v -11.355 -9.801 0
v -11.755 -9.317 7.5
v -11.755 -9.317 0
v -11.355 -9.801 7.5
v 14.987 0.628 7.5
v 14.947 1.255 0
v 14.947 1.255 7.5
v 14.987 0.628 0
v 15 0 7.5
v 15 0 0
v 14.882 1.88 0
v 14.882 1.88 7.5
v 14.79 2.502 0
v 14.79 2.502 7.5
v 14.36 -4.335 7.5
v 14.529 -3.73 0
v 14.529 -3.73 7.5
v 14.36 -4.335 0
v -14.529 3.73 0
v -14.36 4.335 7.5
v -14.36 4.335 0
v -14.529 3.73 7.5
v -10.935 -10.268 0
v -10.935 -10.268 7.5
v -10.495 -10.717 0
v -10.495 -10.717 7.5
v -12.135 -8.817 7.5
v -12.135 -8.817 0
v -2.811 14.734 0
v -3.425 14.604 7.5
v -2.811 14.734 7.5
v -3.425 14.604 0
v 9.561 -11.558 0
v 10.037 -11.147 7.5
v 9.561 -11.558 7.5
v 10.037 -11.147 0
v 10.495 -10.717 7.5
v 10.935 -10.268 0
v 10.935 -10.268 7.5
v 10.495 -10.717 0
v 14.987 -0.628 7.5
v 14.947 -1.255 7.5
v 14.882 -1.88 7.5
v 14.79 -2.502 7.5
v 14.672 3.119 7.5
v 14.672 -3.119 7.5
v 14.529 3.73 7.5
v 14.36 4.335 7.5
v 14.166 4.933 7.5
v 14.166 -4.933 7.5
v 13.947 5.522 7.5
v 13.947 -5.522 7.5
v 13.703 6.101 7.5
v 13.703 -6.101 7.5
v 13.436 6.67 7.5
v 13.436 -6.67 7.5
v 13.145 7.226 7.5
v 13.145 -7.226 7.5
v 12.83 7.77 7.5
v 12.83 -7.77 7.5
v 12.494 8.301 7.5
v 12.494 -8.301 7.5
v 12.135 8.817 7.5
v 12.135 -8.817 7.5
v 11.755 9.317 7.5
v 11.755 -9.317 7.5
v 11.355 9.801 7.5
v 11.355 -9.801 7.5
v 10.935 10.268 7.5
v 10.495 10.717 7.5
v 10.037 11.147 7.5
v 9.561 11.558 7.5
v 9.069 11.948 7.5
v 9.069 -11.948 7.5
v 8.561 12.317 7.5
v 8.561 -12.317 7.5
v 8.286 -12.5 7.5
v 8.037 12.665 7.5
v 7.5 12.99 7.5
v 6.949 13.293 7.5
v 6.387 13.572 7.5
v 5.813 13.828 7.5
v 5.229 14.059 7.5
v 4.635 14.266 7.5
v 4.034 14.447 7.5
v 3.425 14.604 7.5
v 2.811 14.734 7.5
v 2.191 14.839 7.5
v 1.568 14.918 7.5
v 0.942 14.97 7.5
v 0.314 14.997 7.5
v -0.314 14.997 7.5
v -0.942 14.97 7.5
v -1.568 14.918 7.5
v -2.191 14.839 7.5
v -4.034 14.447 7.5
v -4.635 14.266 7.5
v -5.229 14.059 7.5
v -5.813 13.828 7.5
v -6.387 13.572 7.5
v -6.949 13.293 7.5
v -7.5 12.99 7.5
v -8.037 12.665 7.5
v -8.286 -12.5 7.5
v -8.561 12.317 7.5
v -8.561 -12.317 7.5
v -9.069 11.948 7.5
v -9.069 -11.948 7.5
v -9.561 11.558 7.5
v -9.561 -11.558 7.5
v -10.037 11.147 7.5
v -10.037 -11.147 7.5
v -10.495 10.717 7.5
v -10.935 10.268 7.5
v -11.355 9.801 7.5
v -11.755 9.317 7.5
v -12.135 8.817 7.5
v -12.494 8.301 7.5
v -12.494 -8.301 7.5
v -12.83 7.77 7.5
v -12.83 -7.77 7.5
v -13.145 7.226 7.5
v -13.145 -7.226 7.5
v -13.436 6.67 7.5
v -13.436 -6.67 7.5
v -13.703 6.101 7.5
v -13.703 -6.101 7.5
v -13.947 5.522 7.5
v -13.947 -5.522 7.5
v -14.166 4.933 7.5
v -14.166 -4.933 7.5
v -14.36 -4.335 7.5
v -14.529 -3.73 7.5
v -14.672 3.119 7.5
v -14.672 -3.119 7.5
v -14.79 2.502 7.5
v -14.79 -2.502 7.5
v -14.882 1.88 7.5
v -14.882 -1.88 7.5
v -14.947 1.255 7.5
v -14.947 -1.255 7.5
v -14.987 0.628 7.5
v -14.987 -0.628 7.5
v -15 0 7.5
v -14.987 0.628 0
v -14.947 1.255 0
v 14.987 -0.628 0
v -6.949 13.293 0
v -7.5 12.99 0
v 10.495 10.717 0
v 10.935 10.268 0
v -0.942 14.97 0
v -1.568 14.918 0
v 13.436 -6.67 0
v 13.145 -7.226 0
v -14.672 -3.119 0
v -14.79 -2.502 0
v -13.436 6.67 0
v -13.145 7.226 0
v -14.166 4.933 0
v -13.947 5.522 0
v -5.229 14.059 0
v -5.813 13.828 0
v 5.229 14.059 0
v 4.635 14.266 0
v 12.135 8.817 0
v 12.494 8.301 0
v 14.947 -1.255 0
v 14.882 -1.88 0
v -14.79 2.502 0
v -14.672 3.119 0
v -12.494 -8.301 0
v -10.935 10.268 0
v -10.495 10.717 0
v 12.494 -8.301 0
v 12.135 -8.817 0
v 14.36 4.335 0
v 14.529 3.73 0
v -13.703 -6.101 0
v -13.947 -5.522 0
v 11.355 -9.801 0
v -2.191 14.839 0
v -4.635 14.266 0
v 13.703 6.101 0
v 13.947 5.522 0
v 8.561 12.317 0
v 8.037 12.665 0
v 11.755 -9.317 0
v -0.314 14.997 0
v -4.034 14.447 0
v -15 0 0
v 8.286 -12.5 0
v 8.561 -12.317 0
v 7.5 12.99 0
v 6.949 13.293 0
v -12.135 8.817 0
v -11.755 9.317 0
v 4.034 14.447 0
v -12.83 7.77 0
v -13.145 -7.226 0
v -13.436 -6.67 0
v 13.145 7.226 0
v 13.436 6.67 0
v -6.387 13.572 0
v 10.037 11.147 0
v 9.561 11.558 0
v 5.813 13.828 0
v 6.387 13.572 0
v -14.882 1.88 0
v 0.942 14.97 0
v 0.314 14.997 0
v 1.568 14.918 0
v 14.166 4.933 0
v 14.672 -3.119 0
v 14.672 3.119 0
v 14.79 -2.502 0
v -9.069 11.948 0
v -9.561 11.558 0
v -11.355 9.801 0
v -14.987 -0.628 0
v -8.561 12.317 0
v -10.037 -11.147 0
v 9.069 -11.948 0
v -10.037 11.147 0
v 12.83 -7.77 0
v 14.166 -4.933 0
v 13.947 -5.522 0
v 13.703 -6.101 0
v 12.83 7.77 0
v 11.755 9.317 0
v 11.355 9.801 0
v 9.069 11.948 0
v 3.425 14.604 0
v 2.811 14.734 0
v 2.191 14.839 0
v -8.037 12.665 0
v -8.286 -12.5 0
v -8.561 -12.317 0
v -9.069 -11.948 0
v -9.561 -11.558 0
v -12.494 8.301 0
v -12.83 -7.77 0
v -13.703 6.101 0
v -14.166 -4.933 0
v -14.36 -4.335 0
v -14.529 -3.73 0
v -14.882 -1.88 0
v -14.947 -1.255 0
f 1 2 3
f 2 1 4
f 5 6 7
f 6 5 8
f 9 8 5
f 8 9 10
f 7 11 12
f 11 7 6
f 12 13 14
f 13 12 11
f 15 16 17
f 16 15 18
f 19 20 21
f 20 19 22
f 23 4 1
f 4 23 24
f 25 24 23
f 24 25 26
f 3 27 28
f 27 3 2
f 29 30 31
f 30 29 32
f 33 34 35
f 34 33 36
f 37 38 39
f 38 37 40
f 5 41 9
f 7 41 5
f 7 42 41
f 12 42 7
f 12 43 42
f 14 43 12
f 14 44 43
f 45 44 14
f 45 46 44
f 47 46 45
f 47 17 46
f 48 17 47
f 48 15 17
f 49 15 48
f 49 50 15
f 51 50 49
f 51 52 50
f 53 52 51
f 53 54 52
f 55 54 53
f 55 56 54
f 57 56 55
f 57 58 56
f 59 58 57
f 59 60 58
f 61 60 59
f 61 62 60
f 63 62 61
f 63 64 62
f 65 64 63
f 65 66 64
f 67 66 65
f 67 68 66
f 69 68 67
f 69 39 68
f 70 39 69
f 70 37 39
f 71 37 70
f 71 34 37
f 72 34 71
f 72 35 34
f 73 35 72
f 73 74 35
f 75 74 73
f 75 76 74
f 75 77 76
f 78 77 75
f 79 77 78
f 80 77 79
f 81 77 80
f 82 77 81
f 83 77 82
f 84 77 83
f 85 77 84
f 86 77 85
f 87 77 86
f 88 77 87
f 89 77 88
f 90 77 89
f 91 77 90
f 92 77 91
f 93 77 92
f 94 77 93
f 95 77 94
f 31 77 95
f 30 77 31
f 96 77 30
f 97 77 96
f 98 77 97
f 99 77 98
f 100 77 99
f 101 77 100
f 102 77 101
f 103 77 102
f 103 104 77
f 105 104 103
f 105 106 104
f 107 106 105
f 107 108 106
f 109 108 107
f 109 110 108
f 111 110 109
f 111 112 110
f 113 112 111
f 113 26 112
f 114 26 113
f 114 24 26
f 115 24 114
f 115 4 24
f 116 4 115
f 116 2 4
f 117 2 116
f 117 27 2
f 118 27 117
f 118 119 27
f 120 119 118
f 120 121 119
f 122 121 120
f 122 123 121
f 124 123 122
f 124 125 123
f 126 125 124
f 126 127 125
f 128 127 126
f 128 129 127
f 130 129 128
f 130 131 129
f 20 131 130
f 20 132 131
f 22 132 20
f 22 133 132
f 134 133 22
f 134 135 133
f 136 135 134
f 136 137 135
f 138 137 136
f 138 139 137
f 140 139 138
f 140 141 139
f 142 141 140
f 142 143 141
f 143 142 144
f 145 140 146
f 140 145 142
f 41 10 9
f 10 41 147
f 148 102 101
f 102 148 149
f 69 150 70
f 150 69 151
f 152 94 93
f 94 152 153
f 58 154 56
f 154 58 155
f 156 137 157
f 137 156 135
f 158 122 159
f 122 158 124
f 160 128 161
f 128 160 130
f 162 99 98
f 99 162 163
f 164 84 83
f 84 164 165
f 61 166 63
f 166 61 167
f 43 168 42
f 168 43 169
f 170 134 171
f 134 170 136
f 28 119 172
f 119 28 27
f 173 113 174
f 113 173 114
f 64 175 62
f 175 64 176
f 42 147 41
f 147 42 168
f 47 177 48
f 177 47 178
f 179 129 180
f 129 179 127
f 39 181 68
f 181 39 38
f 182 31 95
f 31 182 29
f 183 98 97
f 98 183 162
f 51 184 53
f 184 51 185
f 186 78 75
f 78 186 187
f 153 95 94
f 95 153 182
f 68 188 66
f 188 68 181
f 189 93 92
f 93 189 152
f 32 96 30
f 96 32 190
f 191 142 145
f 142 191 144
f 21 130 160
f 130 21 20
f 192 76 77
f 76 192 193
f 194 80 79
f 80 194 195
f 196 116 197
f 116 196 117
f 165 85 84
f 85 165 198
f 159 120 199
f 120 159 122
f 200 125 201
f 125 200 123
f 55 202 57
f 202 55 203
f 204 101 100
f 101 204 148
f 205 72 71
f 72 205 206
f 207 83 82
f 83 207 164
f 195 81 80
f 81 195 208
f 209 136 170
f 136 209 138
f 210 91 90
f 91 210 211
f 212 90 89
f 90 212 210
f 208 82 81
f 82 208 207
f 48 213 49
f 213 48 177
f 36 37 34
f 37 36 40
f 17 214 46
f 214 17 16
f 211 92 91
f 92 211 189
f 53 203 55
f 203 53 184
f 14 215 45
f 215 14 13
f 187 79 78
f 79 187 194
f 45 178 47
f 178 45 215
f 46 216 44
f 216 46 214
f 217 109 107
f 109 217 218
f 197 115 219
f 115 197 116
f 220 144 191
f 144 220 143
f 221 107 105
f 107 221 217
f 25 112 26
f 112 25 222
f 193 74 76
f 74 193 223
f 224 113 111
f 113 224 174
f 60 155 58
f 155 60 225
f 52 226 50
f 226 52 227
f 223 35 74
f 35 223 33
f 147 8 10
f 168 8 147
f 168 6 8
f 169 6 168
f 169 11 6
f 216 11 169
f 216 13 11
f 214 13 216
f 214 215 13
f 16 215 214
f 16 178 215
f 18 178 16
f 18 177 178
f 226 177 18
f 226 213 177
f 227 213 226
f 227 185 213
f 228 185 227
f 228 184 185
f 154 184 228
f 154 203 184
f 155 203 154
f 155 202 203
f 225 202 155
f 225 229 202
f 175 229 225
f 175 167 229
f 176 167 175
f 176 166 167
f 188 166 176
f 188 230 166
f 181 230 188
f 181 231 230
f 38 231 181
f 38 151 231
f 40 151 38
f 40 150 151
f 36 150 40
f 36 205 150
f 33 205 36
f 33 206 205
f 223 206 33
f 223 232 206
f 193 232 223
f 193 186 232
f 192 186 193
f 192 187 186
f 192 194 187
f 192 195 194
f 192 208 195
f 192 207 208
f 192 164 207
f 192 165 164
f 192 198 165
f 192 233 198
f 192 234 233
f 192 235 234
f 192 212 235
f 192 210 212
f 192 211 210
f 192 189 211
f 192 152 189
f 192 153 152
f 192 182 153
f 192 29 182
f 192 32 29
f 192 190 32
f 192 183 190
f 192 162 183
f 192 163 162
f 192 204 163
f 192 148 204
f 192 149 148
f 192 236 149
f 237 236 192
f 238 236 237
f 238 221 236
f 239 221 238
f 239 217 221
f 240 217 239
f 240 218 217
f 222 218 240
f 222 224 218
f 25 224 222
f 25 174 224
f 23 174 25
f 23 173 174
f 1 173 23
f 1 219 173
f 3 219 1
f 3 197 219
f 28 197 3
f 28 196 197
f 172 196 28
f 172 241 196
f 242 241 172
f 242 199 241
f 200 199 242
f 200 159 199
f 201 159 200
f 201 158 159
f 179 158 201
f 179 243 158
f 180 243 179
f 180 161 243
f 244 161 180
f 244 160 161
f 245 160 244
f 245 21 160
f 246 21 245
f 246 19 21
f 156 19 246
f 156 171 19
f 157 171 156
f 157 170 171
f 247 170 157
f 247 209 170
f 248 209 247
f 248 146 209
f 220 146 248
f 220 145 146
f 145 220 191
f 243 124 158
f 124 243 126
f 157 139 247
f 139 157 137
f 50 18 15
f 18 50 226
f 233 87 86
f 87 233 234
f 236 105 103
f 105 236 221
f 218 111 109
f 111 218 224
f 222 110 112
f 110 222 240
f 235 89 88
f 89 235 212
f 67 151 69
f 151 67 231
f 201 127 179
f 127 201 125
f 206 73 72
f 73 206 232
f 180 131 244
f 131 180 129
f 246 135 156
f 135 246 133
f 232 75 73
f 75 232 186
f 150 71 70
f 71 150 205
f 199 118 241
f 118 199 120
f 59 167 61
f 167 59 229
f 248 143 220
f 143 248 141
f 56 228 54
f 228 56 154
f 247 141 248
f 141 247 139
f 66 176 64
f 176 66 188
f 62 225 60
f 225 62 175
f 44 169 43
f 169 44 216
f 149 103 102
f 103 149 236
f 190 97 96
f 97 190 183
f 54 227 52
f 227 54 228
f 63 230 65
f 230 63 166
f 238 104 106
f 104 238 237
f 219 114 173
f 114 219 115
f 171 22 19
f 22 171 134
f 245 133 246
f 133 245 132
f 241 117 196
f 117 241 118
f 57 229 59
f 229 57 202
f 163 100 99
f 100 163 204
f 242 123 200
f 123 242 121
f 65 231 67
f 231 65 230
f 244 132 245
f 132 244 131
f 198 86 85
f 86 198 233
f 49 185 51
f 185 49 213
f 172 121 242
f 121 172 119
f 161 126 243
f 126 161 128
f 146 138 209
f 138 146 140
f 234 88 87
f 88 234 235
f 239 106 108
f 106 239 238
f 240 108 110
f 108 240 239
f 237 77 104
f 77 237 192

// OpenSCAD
$fn = 150;

difference() {
	cylinder(d = 30.0, h = 7.5);
	translate(v = [0, -20.0, 0]) {
		translate(v = [0, 0, 3.75]) {
			cube(center = true, size = [30.0, 15.0, 9.5]);
		}
	}
}
